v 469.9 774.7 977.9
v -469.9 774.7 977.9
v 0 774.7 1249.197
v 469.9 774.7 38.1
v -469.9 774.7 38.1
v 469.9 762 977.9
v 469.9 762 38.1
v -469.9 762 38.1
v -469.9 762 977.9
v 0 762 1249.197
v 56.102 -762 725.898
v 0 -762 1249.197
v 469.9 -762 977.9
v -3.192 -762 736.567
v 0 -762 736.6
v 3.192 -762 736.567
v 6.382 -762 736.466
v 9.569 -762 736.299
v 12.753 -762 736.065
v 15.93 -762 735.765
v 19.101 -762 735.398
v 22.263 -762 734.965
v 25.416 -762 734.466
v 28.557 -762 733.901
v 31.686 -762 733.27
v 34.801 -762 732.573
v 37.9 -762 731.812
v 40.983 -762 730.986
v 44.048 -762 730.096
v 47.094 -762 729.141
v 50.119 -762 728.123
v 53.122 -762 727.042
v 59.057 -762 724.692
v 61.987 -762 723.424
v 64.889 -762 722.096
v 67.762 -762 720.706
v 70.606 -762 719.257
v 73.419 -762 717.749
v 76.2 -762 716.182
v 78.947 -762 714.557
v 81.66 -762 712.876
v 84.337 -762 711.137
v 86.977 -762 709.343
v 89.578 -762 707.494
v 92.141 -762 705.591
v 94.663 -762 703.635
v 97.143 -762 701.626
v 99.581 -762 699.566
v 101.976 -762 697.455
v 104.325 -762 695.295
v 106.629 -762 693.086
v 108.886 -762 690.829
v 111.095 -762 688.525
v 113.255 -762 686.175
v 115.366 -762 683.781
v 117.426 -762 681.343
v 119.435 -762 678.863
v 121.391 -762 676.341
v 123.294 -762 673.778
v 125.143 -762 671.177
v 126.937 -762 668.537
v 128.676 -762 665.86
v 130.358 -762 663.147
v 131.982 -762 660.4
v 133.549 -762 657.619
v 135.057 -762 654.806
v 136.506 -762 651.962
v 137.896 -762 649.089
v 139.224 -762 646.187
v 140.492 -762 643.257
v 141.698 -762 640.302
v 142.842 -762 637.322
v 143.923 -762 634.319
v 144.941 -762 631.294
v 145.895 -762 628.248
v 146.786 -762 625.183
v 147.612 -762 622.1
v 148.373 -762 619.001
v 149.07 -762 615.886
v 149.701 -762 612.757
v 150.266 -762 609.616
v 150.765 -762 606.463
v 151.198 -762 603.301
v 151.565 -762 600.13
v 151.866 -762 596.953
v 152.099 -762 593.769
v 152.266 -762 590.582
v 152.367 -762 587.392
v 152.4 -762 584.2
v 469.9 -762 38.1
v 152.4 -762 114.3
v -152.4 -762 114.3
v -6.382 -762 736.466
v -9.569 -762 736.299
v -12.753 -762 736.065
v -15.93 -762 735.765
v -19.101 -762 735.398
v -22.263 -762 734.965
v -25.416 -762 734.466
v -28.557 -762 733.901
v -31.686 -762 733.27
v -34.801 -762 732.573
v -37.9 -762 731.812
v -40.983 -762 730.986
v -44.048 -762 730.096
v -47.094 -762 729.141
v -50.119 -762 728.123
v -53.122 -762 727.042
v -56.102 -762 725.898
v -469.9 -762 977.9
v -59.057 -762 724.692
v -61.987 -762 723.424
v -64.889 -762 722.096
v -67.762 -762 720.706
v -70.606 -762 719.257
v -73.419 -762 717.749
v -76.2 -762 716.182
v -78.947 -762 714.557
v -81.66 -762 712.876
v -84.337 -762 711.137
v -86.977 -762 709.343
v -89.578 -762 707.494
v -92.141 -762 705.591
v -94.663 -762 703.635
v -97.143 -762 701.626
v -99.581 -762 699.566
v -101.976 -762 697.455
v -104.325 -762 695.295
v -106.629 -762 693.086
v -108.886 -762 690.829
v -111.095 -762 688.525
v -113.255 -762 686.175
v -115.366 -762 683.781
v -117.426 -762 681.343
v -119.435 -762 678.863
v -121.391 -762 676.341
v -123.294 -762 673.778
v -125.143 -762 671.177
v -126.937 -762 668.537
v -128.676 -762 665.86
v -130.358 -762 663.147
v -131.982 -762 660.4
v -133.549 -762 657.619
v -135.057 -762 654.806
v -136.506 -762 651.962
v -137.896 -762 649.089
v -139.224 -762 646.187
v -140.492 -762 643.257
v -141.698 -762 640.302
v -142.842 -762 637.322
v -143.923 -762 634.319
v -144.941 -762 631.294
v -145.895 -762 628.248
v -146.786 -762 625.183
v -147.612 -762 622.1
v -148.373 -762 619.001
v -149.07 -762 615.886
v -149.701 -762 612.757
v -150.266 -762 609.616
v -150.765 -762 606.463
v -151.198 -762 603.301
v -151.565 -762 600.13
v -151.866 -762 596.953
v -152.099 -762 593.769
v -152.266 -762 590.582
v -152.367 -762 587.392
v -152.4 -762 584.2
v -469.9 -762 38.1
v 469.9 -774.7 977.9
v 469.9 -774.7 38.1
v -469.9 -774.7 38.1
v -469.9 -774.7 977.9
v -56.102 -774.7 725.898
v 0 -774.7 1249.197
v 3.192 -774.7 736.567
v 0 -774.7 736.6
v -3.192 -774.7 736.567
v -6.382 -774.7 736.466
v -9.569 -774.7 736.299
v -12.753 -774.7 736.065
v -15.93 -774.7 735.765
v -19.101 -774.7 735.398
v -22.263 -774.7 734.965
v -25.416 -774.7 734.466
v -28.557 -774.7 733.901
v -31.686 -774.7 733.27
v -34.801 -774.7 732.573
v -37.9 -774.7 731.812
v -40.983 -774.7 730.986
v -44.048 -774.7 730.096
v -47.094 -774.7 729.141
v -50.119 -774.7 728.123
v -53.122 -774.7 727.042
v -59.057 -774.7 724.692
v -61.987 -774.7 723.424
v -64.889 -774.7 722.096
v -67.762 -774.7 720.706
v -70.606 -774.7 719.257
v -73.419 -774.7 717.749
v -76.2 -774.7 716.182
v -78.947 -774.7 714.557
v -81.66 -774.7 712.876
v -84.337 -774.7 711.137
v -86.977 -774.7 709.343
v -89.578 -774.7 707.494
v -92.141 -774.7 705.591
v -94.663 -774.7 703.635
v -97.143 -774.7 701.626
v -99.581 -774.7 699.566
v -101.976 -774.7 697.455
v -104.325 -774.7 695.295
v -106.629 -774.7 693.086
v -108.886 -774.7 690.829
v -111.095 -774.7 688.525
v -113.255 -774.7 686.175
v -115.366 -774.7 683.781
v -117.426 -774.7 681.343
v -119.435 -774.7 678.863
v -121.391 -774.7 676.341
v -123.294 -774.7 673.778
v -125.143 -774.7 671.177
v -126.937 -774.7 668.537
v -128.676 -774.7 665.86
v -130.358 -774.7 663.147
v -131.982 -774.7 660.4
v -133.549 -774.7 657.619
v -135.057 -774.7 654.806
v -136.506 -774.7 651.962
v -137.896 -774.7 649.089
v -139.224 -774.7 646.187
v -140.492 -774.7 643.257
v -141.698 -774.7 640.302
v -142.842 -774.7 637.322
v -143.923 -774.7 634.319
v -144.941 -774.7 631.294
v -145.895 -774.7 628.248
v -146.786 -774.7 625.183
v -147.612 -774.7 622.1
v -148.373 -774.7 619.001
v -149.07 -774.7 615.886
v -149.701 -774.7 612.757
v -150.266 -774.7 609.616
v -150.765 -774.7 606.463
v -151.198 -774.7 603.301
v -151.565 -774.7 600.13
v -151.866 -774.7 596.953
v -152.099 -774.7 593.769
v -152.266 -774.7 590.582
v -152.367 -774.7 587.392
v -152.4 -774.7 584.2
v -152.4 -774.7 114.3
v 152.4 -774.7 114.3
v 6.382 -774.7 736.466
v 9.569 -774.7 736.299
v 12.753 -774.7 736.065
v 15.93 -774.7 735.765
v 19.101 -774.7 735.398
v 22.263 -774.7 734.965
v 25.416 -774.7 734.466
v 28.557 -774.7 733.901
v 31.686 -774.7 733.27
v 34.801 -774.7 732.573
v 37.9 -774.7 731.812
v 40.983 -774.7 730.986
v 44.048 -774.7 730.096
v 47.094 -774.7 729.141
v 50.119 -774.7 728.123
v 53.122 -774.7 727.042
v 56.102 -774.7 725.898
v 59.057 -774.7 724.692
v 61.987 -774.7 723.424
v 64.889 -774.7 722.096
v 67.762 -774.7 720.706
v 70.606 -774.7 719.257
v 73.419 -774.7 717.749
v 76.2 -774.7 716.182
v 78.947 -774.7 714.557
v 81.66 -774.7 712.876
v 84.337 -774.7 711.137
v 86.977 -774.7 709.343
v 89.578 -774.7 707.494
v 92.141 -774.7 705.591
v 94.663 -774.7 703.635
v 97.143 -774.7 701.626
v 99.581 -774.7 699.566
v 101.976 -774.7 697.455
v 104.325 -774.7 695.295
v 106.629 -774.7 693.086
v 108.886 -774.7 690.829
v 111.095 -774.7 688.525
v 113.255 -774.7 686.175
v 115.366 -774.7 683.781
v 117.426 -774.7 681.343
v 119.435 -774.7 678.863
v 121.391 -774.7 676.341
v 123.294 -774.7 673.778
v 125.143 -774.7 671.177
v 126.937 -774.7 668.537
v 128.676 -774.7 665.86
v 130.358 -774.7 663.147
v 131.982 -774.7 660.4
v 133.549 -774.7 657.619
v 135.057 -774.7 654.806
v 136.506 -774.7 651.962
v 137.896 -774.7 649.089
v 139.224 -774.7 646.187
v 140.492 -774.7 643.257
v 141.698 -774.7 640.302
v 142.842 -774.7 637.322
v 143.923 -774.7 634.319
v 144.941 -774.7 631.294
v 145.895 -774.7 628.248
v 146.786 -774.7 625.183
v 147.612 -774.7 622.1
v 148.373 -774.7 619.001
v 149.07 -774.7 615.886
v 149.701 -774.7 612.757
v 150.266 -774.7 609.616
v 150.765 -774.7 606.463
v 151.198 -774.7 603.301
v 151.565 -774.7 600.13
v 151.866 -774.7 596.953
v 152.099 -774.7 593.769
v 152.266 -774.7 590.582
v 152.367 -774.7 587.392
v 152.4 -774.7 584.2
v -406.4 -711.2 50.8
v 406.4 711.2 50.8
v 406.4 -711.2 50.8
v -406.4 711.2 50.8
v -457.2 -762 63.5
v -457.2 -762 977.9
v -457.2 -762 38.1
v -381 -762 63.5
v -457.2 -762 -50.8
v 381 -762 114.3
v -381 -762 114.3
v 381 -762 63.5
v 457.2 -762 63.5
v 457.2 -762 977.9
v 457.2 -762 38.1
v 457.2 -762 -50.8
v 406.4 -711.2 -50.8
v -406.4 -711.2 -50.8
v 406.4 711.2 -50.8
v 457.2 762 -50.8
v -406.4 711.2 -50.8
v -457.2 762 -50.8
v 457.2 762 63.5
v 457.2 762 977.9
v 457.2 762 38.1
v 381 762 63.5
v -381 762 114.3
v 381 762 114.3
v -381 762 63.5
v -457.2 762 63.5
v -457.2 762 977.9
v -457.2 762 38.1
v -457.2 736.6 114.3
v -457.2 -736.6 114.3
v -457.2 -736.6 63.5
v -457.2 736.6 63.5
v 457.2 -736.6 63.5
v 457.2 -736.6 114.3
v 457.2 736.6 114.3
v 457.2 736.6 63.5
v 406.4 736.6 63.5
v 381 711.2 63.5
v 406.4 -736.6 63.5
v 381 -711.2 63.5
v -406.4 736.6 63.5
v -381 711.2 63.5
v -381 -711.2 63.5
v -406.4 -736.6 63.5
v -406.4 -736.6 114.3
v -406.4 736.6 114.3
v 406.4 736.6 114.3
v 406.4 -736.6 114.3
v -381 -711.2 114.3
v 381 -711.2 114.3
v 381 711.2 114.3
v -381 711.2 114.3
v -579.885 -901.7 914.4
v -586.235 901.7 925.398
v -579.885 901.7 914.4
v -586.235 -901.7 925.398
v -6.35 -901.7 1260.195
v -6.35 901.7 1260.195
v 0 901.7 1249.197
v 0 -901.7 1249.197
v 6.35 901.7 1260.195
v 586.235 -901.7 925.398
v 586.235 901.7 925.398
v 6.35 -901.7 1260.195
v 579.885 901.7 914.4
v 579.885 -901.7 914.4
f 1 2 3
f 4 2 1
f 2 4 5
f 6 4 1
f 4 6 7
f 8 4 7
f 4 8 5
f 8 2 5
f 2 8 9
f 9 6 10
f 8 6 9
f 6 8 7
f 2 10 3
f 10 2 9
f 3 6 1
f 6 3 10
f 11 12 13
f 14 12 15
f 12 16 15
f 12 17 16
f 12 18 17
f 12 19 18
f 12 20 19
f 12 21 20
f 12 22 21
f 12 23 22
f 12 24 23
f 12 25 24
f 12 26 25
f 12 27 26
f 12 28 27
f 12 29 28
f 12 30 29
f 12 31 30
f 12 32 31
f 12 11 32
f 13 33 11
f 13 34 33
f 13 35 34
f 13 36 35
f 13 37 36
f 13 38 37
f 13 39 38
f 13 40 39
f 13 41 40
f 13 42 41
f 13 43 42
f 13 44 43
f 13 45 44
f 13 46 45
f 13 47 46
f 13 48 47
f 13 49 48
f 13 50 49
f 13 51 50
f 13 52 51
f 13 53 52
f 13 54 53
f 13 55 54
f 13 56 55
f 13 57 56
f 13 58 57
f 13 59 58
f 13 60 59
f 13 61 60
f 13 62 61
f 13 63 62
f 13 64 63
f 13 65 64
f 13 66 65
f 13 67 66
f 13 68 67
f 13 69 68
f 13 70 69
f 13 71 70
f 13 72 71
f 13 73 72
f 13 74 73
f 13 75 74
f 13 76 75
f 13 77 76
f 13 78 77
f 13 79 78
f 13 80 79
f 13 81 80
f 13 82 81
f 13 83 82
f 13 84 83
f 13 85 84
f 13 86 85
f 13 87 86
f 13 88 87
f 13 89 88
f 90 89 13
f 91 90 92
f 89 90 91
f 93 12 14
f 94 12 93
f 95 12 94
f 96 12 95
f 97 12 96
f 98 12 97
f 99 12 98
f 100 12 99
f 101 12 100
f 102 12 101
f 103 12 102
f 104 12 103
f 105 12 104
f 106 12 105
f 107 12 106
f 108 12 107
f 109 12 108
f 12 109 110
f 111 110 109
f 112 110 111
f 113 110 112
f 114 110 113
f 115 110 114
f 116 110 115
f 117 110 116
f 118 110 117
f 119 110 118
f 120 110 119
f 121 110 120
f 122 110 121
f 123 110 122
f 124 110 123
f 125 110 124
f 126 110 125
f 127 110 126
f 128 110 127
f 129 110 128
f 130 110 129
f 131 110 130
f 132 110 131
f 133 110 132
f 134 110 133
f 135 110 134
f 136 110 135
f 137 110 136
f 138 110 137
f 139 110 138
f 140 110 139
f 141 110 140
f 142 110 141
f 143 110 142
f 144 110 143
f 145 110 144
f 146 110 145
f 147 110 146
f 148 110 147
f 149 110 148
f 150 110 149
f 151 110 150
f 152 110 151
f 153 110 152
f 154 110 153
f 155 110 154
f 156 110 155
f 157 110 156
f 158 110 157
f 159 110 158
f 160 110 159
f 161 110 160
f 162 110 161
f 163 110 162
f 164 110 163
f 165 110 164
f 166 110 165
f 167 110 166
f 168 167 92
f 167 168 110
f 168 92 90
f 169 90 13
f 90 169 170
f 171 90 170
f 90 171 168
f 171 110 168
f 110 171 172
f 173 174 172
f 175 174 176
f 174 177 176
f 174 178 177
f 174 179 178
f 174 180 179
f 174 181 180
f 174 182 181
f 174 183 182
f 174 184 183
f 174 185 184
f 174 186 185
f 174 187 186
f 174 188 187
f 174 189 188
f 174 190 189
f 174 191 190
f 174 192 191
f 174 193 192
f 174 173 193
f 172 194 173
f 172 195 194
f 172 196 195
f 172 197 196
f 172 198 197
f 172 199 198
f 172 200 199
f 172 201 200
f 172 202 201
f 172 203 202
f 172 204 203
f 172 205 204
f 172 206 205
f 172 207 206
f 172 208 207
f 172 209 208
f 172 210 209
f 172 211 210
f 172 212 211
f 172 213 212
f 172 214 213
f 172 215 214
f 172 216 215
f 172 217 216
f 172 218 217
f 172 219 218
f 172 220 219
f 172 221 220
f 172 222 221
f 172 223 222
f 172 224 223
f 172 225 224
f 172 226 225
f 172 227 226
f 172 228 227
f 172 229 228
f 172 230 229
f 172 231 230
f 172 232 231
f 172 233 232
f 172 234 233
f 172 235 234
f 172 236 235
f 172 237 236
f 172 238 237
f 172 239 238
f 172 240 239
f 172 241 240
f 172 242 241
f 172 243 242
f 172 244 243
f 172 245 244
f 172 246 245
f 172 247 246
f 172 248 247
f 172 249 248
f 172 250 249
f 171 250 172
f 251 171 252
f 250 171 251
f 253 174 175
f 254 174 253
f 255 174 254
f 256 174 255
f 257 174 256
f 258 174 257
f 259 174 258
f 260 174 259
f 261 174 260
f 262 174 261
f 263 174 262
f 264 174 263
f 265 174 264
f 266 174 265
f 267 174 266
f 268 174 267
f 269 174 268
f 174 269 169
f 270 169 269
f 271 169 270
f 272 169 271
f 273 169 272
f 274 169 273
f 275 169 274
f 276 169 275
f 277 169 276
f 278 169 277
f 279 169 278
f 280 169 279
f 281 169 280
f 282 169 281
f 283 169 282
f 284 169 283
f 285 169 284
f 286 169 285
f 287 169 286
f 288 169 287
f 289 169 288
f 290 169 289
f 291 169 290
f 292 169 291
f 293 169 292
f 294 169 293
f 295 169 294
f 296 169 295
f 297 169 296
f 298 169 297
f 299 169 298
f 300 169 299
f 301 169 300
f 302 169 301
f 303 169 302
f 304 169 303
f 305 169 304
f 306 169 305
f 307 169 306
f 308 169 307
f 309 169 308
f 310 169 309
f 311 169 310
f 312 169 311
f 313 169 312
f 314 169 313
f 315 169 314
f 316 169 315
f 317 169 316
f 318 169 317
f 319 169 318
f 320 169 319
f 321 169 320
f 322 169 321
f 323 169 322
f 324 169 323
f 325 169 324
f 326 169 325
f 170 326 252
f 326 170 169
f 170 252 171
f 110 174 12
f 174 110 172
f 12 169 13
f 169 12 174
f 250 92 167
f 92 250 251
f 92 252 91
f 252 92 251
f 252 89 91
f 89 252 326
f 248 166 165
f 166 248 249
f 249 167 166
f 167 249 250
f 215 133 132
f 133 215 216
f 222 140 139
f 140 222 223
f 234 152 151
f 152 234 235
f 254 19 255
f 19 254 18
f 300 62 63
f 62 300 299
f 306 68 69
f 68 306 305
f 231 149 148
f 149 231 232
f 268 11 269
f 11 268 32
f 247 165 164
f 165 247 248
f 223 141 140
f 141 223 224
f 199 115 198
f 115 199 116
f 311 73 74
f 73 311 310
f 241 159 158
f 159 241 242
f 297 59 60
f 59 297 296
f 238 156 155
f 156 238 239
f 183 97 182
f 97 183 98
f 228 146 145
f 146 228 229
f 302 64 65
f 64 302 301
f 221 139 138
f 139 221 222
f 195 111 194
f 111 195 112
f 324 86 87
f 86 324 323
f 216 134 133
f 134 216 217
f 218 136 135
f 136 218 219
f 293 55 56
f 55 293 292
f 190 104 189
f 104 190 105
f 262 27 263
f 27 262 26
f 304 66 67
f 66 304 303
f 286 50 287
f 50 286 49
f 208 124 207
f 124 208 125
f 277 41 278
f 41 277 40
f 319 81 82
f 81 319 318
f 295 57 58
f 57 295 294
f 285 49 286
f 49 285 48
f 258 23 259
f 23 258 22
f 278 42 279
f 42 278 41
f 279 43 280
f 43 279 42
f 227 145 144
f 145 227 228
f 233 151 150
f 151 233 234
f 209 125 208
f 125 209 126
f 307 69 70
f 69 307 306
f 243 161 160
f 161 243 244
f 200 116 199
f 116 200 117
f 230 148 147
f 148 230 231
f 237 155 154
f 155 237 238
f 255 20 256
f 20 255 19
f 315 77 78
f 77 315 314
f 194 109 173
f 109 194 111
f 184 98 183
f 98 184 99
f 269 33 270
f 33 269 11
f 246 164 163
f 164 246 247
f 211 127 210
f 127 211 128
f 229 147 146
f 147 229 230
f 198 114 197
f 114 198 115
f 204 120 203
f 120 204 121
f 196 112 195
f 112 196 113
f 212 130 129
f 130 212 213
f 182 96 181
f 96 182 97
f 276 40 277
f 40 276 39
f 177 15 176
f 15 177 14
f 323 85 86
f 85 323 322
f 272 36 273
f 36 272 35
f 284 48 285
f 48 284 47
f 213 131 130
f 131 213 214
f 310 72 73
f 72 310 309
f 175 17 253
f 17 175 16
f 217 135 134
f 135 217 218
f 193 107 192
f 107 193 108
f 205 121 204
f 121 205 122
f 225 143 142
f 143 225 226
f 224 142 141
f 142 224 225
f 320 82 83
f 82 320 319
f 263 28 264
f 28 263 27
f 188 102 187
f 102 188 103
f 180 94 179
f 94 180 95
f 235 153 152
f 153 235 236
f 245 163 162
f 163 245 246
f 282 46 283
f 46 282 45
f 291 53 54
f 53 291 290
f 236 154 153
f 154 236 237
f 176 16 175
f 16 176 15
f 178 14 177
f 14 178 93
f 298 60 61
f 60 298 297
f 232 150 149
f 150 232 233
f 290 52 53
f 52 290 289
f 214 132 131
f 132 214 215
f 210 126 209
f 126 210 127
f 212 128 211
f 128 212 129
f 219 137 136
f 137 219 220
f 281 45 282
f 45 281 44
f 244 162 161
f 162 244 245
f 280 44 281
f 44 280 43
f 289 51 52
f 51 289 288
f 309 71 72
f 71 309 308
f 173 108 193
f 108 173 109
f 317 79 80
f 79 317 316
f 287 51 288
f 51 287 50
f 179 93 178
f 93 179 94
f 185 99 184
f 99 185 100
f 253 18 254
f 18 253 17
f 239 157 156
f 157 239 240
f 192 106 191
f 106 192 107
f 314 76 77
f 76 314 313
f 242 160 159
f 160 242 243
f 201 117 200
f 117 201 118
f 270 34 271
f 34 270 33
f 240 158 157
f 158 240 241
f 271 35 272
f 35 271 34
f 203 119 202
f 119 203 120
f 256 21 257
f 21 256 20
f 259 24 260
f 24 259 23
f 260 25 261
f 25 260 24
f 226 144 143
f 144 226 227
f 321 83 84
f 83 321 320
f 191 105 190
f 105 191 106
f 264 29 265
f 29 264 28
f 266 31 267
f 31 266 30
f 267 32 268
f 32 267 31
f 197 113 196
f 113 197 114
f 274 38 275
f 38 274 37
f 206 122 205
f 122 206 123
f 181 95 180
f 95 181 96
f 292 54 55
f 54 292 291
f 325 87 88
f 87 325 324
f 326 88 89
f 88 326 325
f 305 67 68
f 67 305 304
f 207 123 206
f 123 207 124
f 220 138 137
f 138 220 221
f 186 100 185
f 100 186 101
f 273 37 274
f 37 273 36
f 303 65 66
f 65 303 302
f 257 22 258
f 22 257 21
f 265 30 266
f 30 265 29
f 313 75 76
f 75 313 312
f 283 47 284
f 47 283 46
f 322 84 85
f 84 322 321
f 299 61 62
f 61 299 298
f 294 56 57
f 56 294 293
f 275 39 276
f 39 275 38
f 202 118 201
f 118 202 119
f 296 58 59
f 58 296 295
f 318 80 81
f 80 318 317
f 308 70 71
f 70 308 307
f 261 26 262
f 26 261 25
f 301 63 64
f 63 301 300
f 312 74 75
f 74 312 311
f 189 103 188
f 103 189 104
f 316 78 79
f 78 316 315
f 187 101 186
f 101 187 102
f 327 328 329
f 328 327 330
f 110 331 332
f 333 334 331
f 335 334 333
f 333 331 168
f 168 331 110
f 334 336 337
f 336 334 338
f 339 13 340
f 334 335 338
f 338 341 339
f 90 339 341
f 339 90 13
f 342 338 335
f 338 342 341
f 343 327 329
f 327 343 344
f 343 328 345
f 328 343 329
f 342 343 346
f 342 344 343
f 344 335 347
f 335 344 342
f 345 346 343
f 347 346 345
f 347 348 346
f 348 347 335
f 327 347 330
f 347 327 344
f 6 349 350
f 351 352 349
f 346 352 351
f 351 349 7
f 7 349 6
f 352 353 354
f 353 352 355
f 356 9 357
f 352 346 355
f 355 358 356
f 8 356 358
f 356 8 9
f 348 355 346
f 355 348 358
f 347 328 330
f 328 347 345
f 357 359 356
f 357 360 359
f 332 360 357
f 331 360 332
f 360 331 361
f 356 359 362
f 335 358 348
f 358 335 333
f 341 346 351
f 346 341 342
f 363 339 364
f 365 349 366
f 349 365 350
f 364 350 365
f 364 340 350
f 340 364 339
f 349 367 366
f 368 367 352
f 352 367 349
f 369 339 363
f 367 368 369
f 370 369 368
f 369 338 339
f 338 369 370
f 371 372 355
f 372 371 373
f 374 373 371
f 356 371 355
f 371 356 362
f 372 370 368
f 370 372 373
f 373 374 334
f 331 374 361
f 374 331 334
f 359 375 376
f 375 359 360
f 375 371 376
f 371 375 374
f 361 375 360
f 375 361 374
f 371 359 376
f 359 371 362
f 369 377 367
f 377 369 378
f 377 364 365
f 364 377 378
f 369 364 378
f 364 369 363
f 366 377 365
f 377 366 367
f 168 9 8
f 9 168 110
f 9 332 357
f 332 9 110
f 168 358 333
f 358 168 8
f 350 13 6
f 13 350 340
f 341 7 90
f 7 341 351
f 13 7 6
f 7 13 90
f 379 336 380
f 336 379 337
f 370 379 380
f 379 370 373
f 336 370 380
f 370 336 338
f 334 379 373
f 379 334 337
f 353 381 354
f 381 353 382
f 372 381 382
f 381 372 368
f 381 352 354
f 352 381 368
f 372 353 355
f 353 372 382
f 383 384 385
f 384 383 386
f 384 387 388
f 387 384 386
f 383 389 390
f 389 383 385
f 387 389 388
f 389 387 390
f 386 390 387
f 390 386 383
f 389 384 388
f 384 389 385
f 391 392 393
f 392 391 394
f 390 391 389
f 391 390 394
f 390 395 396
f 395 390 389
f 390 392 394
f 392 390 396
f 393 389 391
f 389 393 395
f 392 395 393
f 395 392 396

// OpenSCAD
// Vorgaben/settings:
//-------------------
$fn = 300;
breite=914.4;
laenge=1524;
unterbau_balken_breite=50.8;
unterbau_balken_hoehe=101.6;
platform_hoehe=12.7;
support_balken_breite=50.8;
support_balken_hoehe=50.8;
hoehe=939.8;
wand_staerke=12.7;
dachneigung=30;
tuer_hoehe=622.3;
tuer_breite=304.8;
dach_ueberstand=127;
dach_staerke=12.7;

// Variable explanations:
//-----------------------
//breite=914.4; //=36*25.4; //width
//laenge=1524; //=60*25.4; //length
//unterbau_balken_breite=50.8; //=2*25.4; //substruction beam width
//unterbau_balken_hoehe=101.6; //=4*25.4; //substruction beam height
//platform_hoehe=12.7; //=0.5*25.4; //platform height
//support_balken_breite=50.8; //=2*25.4; //support beam width
//support_balken_hoehe=50.8; //=2*25.4; //support beam height
//hoehe=939.8; //=37*25.4; //wall height
//wand_staerke=12.7; //=0.5*25.4; //wall width
//dachneigung=30; //grad //roof pitch in degree
//tuer_hoehe=622.3; //=24.5*25.4; //door height (incl. arch)
//tuer_breite=304.8; //=12*25.4; //door width
//dach_ueberstand=127; //=5*25.4; //roof overhang
//dach_staerke=12.7; //=0.5*25.4; //roof thickness

// Rechnungen/calculations:
//-------------------------
hoehe_giebel3eck = (breite / 2 + wand_staerke) * tan(dachneigung);
tuer_rahmenhoehe = tuer_hoehe - tuer_breite / 2;

rotate([0,0,180]){

translate([0, laenge / 2 - unterbau_balken_breite / 2, 0])
{
	houseBaseWidth(breite, unterbau_balken_breite, unterbau_balken_hoehe);
}

translate([0, -(laenge / 2) + unterbau_balken_breite / 2, 0])
{
	houseBaseWidth(breite, unterbau_balken_breite, unterbau_balken_hoehe);
}

translate([breite / 2 - unterbau_balken_breite / 2, 0, 0])
{
	houseBaseLength(laenge, unterbau_balken_breite, unterbau_balken_hoehe);
}

translate([-(breite / 2) + unterbau_balken_breite / 2, 0, 0])
{
	houseBaseLength(laenge, unterbau_balken_breite, unterbau_balken_hoehe);
}

translate([0, 0, unterbau_balken_hoehe / 2 + platform_hoehe / 2])
{
	houseBasePlatform(breite, laenge, platform_hoehe);
}

translate([breite / 2 - support_balken_breite / 2, 0, unterbau_balken_hoehe / 2 + platform_hoehe + support_balken_hoehe / 2])
{
	houseWallLengthSupport(laenge, support_balken_breite, support_balken_hoehe);
}

translate([-(breite / 2) + support_balken_breite / 2, 0, unterbau_balken_hoehe / 2 + platform_hoehe + support_balken_hoehe / 2])
{
	houseWallLengthSupport(laenge, support_balken_breite, support_balken_hoehe);
}

translate([breite / 2 + wand_staerke / 2, 0, hoehe / 2 + unterbau_balken_hoehe / 2 - platform_hoehe])
{
	houseWallLength(laenge, hoehe, wand_staerke);
}

translate([- breite / 2 - wand_staerke / 2, 0, hoehe / 2 + unterbau_balken_hoehe / 2 - platform_hoehe])
{
	houseWallLength(laenge, hoehe, wand_staerke);
}

translate([0, laenge / 2 - support_balken_breite / 2, unterbau_balken_hoehe / 2 + platform_hoehe + support_balken_hoehe / 2])
{
	houseWallWidthSupport(breite, support_balken_breite, support_balken_hoehe);
}

translate([0, -(laenge / 2) + support_balken_breite / 2, unterbau_balken_hoehe / 2 + platform_hoehe + support_balken_hoehe / 2])
{
	houseWallWidthSupport(breite, support_balken_breite, support_balken_hoehe);
}

translate([0, -laenge / 2 - wand_staerke / 2, hoehe / 2 + unterbau_balken_hoehe / 2 - platform_hoehe])
{
	houseWallBack(laenge, breite, hoehe, wand_staerke, hoehe_giebel3eck);
}

translate([0, laenge / 2 + wand_staerke / 2, hoehe / 2 + unterbau_balken_hoehe / 2 - platform_hoehe])
{
	houseWallFront(laenge, breite, hoehe, wand_staerke, hoehe_giebel3eck, tuer_breite, tuer_rahmenhoehe);
}

translate([0, - laenge / 2 - wand_staerke - dach_ueberstand, hoehe + hoehe_giebel3eck + platform_hoehe + support_balken_hoehe / 2])
{
	roofPanel(laenge, breite, hoehe_giebel3eck, dach_ueberstand, dachneigung, dach_staerke, wand_staerke);
}

translate([0, laenge / 2 + wand_staerke + dach_ueberstand, hoehe + hoehe_giebel3eck + platform_hoehe + support_balken_hoehe / 2])
{
    rotate([0, 0, 180]){
        roofPanel(laenge, breite, hoehe_giebel3eck, dach_ueberstand, dachneigung, dach_staerke, wand_staerke);
    }
}

} //end house rotate

module houseBaseWidth(breite, unterbau_balken_breite, unterbau_balken_hoehe)
{
	rotate([0, 0, 90])
	{
		cube([unterbau_balken_breite, breite - 2 * unterbau_balken_breite, unterbau_balken_hoehe], center = true);
	}
}
module houseBaseLength(laenge, unterbau_balken_breite, unterbau_balken_hoehe)
{
	cube([unterbau_balken_breite, laenge, unterbau_balken_hoehe], center = true);
}
module houseBasePlatform(breite, laenge, platform_hoehe)
{
	cube([breite, laenge, platform_hoehe], center = true);
}
module houseWallLengthSupport(laenge, support_balken_breite, support_balken_hoehe)
{
	cube([support_balken_breite, laenge - 2 * support_balken_breite + support_balken_breite, support_balken_hoehe], center = true);
}
module houseWallWidthSupport(breite, support_balken_breite, support_balken_hoehe)
{
	rotate([0, 0, 90])
	{
		cube([support_balken_breite, breite - 2 * support_balken_breite - support_balken_breite, support_balken_hoehe], center = true);
	}
}
module houseWallLength(laenge, hoehe, wand_staerke)
{
	cube([wand_staerke, laenge, hoehe], center = true);
}
module houseWallBack(laenge, breite, hoehe, wand_staerke, hoehe_giebel3eck)
{
    rotate([0, 0, 90]){
        cube([wand_staerke, breite + 2 * wand_staerke, hoehe], center = true);
    }//end rotate

    translate([breite / 2 + wand_staerke, -wand_staerke / 2, hoehe / 2]){
        rotate([0, 0, 90]){
            prism(wand_staerke, breite / 2 + wand_staerke, hoehe_giebel3eck);
        }
    }
    
    translate([-breite / 2 - wand_staerke, wand_staerke / 2, hoehe / 2]){
        rotate([0, 0, -90]){
            prism(wand_staerke, breite / 2 + wand_staerke, hoehe_giebel3eck);
        }
    }
}
module houseWallFront(laenge, breite, hoehe, wand_staerke, hoehe_giebel3eck, tuer_breite, tuer_rahmenhoehe)
{
    difference(){
        
        union(){
                
            rotate([0, 0, 90]){
                cube([wand_staerke, breite + 2 * wand_staerke, hoehe], center = true);
            }//end rotate
        
            translate([breite / 2 + wand_staerke, -wand_staerke / 2, hoehe / 2]){
                rotate([0, 0, 90]){
                    prism(wand_staerke, breite / 2 + wand_staerke, hoehe_giebel3eck);
                }
            }
            
            translate([-breite / 2 - wand_staerke, wand_staerke / 2, hoehe / 2]){
                rotate([0, 0, -90]){
                    prism(wand_staerke, breite / 2 + wand_staerke, hoehe_giebel3eck);
                }//end rotate
            }//end translate
        }//end wall union
 	
        union()
        {	
            translate([0, 0, -hoehe / 2 + 2 * platform_hoehe + support_balken_hoehe + tuer_rahmenhoehe / 2])
            {
                cube([tuer_breite, 2 * wand_staerke, tuer_rahmenhoehe], center = true);
            }// end translate
        
            translate([0, 0, -hoehe / 2 + 2 * platform_hoehe + support_balken_hoehe + tuer_rahmenhoehe])
            {
                rotate([90, 0, 0])
                {
                    cylinder(d = tuer_breite, h = 2 * wand_staerke, center = true);
                }// end rotate
            }// end translate
        }// end door union
    }// end difference
}//end module
module roofPanel(laenge, breite, hoehe_giebel3eck, dach_ueberstand, dachneigung, dach_staerke, wand_staerke)
{
    rotate([0, dachneigung, 0])
    {
        cube([ sqrt ( pow ( hoehe_giebel3eck, 2) + pow (breite / 2 + wand_staerke, 2) ) + dach_ueberstand, laenge + 2 * dach_ueberstand + 2 * wand_staerke, dach_staerke], center = false);
    }//end rotate
}// end module
module prism(l, w, h){
       polyhedron(
               points=[[0,0,0], [l,0,0], [l,w,0], [0,w,0], [0,w,h], [l,w,h]],
               faces=[[0,1,2,3],[5,4,3,2],[0,4,5,1],[0,3,4],[5,2,1]]
               );
}
